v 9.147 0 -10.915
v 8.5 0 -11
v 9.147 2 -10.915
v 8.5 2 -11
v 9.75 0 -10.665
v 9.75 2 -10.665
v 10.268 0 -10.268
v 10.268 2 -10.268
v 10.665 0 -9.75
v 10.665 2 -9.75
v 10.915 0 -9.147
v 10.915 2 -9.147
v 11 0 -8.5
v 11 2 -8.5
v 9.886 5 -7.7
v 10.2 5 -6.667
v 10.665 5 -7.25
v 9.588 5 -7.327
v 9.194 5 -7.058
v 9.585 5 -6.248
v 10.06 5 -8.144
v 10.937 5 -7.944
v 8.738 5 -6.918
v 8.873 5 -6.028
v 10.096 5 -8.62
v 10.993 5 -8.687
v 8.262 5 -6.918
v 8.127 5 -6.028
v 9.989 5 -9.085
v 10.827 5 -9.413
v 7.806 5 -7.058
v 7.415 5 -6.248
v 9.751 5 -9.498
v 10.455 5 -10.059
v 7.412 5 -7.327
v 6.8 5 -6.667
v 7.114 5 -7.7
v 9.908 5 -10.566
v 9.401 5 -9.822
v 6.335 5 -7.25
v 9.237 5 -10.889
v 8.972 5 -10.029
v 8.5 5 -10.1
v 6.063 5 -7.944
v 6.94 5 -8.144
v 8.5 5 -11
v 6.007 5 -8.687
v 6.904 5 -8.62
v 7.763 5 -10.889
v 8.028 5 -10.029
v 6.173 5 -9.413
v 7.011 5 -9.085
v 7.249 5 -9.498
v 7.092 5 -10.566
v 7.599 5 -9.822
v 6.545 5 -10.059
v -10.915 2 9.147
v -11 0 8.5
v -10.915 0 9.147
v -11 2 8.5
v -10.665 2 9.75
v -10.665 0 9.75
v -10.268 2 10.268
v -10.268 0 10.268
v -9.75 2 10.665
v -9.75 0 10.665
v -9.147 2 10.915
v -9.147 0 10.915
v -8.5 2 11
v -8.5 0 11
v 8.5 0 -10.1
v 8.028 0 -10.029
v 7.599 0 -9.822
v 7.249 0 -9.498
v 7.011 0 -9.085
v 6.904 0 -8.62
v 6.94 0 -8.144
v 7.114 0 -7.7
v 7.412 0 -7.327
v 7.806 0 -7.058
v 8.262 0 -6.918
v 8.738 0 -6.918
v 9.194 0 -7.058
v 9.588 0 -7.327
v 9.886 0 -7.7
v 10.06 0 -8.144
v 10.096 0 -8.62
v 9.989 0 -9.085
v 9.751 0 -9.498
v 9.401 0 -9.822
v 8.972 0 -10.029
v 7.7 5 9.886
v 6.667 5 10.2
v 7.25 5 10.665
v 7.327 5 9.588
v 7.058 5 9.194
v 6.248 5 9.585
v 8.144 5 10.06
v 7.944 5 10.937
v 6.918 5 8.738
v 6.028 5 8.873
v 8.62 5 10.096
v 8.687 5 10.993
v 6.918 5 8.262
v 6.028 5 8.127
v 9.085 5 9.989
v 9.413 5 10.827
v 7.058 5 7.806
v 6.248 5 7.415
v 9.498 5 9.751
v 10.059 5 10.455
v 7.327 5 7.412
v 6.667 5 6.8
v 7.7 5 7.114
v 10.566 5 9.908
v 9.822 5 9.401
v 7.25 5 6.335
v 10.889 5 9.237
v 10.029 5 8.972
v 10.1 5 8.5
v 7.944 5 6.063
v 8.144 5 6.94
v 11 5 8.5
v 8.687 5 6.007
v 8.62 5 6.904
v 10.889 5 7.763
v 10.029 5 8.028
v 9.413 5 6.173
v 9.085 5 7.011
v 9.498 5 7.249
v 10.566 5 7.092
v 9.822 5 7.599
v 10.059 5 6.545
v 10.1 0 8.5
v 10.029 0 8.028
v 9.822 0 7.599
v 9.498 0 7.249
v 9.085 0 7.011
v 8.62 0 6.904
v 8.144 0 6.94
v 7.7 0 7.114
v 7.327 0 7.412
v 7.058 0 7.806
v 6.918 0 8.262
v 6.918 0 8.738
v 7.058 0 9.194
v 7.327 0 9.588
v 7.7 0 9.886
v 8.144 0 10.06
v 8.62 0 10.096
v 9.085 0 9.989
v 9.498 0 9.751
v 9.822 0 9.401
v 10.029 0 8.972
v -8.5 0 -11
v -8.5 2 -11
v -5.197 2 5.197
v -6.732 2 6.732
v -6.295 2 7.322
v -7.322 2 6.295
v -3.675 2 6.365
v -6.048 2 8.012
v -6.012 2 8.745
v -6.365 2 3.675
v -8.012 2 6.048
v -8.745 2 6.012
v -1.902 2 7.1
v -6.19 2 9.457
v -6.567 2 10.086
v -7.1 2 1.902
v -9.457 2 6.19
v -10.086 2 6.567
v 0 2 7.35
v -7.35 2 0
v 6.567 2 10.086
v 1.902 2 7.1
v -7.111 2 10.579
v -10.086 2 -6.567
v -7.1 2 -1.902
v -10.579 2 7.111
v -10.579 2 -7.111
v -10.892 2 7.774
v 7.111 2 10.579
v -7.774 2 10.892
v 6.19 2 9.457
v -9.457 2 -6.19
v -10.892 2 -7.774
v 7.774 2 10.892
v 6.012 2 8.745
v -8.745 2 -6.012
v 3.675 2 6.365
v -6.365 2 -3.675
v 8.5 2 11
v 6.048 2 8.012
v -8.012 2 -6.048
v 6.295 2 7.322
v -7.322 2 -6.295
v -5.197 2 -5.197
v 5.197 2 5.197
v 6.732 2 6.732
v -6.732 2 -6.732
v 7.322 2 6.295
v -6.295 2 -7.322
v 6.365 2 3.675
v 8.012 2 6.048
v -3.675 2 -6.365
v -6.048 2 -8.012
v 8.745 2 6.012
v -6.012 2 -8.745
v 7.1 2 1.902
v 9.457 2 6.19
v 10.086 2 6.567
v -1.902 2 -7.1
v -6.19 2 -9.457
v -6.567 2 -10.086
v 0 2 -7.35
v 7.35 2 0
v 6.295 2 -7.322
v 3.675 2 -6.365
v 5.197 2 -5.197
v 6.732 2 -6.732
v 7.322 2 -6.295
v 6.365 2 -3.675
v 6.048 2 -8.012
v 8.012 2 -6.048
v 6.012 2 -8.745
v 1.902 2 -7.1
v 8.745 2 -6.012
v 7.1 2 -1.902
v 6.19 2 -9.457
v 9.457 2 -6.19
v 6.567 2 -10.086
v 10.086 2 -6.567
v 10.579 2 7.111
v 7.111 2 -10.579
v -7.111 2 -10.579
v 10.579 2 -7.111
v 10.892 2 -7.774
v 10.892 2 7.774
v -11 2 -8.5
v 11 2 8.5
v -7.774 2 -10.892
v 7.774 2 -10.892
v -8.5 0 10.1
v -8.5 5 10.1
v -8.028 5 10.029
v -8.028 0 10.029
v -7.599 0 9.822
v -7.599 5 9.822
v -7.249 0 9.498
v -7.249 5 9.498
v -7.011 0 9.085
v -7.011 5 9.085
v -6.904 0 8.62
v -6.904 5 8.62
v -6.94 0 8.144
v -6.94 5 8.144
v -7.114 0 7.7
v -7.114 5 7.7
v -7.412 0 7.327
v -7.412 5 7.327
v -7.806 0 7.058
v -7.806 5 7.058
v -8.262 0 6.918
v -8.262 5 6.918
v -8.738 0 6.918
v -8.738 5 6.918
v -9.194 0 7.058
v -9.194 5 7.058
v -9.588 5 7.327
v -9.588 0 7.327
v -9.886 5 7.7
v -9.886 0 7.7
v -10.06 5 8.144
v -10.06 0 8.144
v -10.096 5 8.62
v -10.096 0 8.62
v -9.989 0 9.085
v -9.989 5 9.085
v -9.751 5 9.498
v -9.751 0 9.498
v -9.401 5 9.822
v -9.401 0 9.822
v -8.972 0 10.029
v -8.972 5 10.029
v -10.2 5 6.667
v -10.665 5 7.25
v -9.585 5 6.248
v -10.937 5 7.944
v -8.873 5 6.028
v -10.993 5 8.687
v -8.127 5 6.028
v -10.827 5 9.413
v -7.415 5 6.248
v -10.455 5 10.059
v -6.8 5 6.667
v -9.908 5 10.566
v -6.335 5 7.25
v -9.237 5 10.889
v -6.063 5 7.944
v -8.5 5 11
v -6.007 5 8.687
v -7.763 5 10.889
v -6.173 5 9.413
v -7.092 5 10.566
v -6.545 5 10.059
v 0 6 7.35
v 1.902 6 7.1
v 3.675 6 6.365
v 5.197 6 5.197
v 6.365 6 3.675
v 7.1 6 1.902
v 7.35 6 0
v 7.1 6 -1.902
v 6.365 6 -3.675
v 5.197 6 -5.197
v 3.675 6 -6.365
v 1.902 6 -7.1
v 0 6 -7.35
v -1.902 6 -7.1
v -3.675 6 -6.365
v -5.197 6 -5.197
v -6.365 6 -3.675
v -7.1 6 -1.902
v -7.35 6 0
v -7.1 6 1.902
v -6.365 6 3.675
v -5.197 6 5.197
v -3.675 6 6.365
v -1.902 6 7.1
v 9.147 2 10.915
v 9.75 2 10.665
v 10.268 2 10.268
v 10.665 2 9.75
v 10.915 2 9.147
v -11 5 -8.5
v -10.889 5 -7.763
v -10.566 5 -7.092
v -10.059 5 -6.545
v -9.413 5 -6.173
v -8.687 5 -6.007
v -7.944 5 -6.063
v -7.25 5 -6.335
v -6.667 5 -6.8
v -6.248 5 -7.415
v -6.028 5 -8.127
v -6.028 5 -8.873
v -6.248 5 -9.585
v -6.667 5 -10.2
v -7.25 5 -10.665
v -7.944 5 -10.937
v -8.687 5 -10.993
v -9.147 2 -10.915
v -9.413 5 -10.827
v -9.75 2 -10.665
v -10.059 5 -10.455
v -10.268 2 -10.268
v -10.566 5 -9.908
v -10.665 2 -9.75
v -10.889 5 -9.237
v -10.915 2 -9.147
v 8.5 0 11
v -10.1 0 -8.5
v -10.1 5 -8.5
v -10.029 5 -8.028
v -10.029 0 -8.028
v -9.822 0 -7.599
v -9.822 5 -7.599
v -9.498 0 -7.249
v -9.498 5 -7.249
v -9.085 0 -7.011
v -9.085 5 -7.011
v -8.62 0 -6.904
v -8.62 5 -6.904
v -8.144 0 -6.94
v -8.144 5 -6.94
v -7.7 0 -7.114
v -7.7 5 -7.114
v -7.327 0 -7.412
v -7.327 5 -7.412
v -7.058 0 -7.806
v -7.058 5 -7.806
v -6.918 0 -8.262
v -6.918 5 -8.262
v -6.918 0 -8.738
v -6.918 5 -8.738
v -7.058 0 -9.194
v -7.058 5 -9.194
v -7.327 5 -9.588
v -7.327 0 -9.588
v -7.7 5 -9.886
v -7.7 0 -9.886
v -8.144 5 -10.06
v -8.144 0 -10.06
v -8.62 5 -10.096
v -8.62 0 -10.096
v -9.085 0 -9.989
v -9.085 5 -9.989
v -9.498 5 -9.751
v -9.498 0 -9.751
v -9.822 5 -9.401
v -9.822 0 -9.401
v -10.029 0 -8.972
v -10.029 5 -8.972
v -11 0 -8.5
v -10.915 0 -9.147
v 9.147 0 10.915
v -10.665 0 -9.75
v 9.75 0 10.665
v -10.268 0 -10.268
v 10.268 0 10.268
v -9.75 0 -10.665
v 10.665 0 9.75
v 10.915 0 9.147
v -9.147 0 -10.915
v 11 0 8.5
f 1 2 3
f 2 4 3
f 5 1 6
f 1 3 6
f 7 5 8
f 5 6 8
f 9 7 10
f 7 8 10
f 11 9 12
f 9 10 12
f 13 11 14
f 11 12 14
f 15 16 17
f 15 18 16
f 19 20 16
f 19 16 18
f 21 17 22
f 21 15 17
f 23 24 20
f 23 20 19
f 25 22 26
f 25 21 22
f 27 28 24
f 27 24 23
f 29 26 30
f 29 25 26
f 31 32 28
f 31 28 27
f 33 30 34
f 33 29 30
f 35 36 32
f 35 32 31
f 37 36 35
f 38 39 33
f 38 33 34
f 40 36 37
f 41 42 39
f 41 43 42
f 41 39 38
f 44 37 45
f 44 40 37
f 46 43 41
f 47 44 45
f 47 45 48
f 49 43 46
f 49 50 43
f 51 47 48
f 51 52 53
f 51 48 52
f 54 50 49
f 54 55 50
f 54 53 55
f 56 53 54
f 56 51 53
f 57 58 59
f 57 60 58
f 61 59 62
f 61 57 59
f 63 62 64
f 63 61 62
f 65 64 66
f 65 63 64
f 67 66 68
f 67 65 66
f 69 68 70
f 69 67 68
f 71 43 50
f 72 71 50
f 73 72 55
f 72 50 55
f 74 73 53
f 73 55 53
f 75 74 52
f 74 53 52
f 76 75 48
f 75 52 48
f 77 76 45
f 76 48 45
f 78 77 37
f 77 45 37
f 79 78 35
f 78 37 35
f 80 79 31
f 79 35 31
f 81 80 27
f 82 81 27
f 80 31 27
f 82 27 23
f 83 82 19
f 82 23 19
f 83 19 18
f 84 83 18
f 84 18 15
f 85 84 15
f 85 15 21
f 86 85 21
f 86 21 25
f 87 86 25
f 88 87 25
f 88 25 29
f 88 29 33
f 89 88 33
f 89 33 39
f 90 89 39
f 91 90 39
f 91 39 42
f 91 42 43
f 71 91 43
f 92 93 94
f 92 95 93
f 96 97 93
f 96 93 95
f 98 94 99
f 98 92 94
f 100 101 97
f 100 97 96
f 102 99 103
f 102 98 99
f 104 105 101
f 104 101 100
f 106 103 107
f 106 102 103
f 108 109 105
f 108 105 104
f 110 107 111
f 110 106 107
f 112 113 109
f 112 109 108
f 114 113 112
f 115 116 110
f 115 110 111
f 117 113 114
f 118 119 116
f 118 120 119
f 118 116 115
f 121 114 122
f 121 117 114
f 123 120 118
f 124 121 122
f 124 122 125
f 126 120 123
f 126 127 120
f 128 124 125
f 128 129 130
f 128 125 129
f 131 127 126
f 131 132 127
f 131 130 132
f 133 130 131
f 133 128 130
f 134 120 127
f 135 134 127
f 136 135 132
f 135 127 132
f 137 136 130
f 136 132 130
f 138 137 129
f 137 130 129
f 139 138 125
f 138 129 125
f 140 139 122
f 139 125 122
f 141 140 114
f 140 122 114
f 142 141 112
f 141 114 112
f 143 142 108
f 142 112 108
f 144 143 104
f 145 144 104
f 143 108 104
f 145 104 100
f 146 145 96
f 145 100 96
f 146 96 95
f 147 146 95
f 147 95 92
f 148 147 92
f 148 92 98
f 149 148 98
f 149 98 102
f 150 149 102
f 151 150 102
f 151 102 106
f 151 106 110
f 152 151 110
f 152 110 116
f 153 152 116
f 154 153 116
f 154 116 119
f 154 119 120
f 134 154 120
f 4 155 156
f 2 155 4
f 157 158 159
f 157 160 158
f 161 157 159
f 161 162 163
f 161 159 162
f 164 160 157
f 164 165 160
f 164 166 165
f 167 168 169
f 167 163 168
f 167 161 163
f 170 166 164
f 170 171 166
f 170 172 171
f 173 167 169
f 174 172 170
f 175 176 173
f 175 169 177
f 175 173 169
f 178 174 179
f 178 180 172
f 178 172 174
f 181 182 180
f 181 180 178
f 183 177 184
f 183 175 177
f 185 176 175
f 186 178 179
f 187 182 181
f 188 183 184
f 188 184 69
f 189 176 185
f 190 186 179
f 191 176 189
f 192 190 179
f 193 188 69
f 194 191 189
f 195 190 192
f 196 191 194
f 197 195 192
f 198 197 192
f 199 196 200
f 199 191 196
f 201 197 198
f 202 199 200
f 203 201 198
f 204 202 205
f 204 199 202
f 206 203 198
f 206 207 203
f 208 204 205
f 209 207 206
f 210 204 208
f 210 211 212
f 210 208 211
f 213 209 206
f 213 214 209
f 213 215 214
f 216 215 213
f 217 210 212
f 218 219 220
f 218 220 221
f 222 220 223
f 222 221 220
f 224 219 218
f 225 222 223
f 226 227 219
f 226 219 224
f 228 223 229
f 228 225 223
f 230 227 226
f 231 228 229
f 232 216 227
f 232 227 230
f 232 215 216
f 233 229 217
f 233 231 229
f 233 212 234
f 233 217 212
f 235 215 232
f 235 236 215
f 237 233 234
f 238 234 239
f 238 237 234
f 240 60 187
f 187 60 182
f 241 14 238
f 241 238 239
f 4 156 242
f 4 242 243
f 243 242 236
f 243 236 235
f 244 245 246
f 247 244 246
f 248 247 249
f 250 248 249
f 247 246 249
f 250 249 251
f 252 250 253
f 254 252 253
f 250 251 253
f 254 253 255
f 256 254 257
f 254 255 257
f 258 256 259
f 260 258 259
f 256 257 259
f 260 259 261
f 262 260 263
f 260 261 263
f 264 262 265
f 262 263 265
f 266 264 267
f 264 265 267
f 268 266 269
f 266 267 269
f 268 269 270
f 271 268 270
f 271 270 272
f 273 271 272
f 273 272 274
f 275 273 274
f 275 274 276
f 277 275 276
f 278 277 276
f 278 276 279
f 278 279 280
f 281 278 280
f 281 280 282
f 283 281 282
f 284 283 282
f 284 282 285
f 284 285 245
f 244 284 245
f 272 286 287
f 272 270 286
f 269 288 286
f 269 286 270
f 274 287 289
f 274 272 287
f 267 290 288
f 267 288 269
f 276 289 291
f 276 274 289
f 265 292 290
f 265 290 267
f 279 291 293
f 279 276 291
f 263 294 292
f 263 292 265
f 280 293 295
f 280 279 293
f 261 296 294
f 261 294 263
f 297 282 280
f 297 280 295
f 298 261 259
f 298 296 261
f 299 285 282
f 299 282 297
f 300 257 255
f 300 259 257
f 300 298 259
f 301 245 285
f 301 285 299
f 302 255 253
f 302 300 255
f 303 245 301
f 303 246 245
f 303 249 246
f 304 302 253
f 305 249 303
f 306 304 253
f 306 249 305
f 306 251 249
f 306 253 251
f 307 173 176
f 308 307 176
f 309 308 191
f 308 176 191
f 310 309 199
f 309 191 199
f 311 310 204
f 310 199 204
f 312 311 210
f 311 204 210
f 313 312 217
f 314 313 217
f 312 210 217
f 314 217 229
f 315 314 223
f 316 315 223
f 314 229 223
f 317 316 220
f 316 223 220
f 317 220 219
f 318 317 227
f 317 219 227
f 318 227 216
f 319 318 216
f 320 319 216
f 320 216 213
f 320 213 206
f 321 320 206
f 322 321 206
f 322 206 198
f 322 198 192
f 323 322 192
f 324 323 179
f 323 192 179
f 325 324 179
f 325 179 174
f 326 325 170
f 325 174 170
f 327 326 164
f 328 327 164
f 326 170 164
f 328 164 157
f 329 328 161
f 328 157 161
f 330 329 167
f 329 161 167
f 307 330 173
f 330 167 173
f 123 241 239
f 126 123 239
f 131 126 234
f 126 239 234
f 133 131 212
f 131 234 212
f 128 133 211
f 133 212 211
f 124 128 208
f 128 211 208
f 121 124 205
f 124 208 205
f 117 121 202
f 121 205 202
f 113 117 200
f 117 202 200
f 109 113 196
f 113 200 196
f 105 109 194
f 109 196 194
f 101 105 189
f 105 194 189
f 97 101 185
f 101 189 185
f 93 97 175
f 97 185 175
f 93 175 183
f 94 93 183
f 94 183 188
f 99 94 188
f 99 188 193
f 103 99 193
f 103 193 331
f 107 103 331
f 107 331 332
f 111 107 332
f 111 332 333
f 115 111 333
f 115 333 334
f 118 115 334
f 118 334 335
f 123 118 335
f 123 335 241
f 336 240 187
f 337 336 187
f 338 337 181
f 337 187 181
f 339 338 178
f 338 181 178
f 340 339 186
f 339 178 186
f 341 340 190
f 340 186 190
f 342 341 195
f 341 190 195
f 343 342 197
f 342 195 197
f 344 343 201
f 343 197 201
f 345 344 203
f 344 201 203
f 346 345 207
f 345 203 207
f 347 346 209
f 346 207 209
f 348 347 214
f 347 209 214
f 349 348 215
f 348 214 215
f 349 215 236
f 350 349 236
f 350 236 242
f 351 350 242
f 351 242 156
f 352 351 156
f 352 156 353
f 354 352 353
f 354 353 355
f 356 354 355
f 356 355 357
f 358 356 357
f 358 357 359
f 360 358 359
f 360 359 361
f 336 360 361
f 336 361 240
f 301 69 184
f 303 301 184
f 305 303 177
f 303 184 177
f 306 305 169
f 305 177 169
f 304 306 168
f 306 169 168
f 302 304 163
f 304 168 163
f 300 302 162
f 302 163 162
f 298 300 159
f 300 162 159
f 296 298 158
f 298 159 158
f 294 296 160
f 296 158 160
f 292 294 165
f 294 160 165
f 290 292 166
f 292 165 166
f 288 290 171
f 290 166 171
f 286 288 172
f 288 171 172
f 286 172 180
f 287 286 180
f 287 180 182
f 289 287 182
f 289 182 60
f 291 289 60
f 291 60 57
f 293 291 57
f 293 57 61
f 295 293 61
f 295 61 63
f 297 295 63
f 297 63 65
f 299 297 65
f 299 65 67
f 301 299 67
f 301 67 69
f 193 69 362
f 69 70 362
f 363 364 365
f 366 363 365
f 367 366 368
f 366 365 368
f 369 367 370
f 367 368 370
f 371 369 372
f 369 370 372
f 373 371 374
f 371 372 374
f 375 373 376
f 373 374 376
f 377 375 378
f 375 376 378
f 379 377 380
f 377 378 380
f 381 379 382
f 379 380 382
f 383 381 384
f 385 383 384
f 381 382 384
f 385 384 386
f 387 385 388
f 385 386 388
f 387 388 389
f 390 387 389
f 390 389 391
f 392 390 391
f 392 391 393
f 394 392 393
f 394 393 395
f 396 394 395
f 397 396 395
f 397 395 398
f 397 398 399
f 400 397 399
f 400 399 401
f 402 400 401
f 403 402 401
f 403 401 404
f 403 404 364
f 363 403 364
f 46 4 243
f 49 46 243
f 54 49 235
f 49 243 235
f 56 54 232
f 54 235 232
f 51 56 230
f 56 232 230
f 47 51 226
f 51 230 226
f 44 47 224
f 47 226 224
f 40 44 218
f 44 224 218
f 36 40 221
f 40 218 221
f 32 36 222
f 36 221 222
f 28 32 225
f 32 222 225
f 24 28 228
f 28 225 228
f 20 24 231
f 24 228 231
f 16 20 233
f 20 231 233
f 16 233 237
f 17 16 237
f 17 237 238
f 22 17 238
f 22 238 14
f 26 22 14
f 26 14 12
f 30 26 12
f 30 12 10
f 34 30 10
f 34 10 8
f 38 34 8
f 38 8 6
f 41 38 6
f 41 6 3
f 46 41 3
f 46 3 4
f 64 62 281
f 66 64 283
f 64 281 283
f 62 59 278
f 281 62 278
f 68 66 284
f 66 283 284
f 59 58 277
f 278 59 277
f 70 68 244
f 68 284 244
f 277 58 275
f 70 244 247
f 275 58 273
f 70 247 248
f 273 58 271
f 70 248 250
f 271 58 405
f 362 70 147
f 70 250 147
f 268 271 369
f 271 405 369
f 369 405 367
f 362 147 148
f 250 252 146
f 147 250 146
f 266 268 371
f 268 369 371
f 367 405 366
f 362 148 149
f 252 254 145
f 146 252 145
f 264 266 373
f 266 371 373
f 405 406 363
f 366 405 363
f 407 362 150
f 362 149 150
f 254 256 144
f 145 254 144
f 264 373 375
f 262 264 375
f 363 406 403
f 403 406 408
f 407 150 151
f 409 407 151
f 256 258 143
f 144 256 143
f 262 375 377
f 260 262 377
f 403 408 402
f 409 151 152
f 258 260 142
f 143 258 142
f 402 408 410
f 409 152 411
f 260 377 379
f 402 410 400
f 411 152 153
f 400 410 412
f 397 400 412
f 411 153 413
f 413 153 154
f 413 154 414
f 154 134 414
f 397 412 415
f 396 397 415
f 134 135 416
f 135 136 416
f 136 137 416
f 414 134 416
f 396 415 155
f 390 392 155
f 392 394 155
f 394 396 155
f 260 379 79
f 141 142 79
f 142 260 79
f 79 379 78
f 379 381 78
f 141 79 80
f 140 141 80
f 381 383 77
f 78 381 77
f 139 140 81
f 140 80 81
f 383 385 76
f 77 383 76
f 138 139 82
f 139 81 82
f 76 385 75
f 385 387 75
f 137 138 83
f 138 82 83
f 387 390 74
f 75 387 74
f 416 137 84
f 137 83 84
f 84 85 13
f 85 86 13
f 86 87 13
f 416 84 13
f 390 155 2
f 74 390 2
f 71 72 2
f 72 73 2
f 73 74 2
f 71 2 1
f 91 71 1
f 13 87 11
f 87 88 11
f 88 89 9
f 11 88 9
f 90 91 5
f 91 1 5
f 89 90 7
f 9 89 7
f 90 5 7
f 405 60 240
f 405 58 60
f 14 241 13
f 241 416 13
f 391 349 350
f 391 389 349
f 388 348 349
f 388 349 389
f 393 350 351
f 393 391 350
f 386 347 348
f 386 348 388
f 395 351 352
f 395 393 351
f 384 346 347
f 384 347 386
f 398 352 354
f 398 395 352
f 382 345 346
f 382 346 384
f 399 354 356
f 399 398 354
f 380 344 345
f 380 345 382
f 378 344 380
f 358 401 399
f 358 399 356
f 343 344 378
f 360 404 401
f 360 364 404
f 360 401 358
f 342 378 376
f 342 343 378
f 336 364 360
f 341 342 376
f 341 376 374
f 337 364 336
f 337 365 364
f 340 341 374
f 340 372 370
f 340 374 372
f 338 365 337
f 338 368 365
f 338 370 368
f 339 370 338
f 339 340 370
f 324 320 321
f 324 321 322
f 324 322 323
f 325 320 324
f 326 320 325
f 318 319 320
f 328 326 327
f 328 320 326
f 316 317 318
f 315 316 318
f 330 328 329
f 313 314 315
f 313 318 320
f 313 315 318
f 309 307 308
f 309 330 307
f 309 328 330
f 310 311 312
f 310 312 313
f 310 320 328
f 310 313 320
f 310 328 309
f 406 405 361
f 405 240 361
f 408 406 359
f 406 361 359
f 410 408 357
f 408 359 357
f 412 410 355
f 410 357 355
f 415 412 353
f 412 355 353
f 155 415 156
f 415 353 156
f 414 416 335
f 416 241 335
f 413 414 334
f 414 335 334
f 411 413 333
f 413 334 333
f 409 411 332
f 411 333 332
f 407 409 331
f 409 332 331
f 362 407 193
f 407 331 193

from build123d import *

# Parameters (mm, degrees)
SKETCH1_W           = 22
SKETCH1_H           = 22
BOSS_EXTRUDE1_DEPTH = 2
SKETCH2_R           = 7.35
BOSS_EXTRUDE2_DEPTH = 4
SKETCH3_R           = 2.5
BOSS_EXTRUDE3_DEPTH = 3
SKETCH4_R           = 1.6
CUT_EXTRUDE1_DEPTH  = 17.340134638
CIRPATTERN1_COUNT   = 4
FILLET1_R           = 2.5


with BuildPart() as part:
    # Sketch1 → Boss-Extrude1 (new body)
    with BuildSketch(Plane(origin=(0, 0, 0), x_dir=(1, 0, 0), z_dir=(0, 1, 0))):
        Rectangle(SKETCH1_W, SKETCH1_H)
    extrude(amount=BOSS_EXTRUDE1_DEPTH)

    # Sketch2 → Boss-Extrude2 (add)
    with BuildSketch(Plane(origin=(0, 2, 0), x_dir=(1, 0, 0), z_dir=(0, 1, 0))):
        Circle(SKETCH2_R)
    extrude(amount=BOSS_EXTRUDE2_DEPTH)

    # Sketch3 → Boss-Extrude3 (add)
    with BuildSketch(Plane(origin=(0, 2, 0), x_dir=(1, 0, 0), z_dir=(0, 1, 0))):
        with Locations((-8.5, -8.5)):
            Circle(SKETCH3_R)
    boss_extrude3 = extrude(amount=BOSS_EXTRUDE3_DEPTH)

    # Sketch4 → Cut-Extrude1 (cut, through all)
    with BuildSketch(Plane(origin=(0, 5, 0), x_dir=(1, 0, 0), z_dir=(0, 1, 0))):
        with Locations((-8.5, -8.5)):
            Circle(SKETCH4_R)
    cut_extrude1 = extrude(amount=-CUT_EXTRUDE1_DEPTH, mode=Mode.SUBTRACT)

    # CirPattern1: Boss-Extrude3, Cut-Extrude1 ×4 about axis
    cirpattern1_axis = Axis((0, 6, 0), (0, -1, 0))
    add([boss_extrude3.rotate(cirpattern1_axis, i * 360 / CIRPATTERN1_COUNT) for i in range(1, CIRPATTERN1_COUNT)])
    add([cut_extrude1.rotate(cirpattern1_axis, i * 360 / CIRPATTERN1_COUNT) for i in range(1, CIRPATTERN1_COUNT)], mode=Mode.SUBTRACT)

    # Fillet1
    fillet1_edges = [part.edges().sort_by_distance(p)[0] for p in [
        (11, 1, -11),
        (-11, 1, -11),
        (11, 1, 11),
        (-11, 1, 11),
    ]]
    fillet(fillet1_edges, radius=FILLET1_R)


solid = part.part
